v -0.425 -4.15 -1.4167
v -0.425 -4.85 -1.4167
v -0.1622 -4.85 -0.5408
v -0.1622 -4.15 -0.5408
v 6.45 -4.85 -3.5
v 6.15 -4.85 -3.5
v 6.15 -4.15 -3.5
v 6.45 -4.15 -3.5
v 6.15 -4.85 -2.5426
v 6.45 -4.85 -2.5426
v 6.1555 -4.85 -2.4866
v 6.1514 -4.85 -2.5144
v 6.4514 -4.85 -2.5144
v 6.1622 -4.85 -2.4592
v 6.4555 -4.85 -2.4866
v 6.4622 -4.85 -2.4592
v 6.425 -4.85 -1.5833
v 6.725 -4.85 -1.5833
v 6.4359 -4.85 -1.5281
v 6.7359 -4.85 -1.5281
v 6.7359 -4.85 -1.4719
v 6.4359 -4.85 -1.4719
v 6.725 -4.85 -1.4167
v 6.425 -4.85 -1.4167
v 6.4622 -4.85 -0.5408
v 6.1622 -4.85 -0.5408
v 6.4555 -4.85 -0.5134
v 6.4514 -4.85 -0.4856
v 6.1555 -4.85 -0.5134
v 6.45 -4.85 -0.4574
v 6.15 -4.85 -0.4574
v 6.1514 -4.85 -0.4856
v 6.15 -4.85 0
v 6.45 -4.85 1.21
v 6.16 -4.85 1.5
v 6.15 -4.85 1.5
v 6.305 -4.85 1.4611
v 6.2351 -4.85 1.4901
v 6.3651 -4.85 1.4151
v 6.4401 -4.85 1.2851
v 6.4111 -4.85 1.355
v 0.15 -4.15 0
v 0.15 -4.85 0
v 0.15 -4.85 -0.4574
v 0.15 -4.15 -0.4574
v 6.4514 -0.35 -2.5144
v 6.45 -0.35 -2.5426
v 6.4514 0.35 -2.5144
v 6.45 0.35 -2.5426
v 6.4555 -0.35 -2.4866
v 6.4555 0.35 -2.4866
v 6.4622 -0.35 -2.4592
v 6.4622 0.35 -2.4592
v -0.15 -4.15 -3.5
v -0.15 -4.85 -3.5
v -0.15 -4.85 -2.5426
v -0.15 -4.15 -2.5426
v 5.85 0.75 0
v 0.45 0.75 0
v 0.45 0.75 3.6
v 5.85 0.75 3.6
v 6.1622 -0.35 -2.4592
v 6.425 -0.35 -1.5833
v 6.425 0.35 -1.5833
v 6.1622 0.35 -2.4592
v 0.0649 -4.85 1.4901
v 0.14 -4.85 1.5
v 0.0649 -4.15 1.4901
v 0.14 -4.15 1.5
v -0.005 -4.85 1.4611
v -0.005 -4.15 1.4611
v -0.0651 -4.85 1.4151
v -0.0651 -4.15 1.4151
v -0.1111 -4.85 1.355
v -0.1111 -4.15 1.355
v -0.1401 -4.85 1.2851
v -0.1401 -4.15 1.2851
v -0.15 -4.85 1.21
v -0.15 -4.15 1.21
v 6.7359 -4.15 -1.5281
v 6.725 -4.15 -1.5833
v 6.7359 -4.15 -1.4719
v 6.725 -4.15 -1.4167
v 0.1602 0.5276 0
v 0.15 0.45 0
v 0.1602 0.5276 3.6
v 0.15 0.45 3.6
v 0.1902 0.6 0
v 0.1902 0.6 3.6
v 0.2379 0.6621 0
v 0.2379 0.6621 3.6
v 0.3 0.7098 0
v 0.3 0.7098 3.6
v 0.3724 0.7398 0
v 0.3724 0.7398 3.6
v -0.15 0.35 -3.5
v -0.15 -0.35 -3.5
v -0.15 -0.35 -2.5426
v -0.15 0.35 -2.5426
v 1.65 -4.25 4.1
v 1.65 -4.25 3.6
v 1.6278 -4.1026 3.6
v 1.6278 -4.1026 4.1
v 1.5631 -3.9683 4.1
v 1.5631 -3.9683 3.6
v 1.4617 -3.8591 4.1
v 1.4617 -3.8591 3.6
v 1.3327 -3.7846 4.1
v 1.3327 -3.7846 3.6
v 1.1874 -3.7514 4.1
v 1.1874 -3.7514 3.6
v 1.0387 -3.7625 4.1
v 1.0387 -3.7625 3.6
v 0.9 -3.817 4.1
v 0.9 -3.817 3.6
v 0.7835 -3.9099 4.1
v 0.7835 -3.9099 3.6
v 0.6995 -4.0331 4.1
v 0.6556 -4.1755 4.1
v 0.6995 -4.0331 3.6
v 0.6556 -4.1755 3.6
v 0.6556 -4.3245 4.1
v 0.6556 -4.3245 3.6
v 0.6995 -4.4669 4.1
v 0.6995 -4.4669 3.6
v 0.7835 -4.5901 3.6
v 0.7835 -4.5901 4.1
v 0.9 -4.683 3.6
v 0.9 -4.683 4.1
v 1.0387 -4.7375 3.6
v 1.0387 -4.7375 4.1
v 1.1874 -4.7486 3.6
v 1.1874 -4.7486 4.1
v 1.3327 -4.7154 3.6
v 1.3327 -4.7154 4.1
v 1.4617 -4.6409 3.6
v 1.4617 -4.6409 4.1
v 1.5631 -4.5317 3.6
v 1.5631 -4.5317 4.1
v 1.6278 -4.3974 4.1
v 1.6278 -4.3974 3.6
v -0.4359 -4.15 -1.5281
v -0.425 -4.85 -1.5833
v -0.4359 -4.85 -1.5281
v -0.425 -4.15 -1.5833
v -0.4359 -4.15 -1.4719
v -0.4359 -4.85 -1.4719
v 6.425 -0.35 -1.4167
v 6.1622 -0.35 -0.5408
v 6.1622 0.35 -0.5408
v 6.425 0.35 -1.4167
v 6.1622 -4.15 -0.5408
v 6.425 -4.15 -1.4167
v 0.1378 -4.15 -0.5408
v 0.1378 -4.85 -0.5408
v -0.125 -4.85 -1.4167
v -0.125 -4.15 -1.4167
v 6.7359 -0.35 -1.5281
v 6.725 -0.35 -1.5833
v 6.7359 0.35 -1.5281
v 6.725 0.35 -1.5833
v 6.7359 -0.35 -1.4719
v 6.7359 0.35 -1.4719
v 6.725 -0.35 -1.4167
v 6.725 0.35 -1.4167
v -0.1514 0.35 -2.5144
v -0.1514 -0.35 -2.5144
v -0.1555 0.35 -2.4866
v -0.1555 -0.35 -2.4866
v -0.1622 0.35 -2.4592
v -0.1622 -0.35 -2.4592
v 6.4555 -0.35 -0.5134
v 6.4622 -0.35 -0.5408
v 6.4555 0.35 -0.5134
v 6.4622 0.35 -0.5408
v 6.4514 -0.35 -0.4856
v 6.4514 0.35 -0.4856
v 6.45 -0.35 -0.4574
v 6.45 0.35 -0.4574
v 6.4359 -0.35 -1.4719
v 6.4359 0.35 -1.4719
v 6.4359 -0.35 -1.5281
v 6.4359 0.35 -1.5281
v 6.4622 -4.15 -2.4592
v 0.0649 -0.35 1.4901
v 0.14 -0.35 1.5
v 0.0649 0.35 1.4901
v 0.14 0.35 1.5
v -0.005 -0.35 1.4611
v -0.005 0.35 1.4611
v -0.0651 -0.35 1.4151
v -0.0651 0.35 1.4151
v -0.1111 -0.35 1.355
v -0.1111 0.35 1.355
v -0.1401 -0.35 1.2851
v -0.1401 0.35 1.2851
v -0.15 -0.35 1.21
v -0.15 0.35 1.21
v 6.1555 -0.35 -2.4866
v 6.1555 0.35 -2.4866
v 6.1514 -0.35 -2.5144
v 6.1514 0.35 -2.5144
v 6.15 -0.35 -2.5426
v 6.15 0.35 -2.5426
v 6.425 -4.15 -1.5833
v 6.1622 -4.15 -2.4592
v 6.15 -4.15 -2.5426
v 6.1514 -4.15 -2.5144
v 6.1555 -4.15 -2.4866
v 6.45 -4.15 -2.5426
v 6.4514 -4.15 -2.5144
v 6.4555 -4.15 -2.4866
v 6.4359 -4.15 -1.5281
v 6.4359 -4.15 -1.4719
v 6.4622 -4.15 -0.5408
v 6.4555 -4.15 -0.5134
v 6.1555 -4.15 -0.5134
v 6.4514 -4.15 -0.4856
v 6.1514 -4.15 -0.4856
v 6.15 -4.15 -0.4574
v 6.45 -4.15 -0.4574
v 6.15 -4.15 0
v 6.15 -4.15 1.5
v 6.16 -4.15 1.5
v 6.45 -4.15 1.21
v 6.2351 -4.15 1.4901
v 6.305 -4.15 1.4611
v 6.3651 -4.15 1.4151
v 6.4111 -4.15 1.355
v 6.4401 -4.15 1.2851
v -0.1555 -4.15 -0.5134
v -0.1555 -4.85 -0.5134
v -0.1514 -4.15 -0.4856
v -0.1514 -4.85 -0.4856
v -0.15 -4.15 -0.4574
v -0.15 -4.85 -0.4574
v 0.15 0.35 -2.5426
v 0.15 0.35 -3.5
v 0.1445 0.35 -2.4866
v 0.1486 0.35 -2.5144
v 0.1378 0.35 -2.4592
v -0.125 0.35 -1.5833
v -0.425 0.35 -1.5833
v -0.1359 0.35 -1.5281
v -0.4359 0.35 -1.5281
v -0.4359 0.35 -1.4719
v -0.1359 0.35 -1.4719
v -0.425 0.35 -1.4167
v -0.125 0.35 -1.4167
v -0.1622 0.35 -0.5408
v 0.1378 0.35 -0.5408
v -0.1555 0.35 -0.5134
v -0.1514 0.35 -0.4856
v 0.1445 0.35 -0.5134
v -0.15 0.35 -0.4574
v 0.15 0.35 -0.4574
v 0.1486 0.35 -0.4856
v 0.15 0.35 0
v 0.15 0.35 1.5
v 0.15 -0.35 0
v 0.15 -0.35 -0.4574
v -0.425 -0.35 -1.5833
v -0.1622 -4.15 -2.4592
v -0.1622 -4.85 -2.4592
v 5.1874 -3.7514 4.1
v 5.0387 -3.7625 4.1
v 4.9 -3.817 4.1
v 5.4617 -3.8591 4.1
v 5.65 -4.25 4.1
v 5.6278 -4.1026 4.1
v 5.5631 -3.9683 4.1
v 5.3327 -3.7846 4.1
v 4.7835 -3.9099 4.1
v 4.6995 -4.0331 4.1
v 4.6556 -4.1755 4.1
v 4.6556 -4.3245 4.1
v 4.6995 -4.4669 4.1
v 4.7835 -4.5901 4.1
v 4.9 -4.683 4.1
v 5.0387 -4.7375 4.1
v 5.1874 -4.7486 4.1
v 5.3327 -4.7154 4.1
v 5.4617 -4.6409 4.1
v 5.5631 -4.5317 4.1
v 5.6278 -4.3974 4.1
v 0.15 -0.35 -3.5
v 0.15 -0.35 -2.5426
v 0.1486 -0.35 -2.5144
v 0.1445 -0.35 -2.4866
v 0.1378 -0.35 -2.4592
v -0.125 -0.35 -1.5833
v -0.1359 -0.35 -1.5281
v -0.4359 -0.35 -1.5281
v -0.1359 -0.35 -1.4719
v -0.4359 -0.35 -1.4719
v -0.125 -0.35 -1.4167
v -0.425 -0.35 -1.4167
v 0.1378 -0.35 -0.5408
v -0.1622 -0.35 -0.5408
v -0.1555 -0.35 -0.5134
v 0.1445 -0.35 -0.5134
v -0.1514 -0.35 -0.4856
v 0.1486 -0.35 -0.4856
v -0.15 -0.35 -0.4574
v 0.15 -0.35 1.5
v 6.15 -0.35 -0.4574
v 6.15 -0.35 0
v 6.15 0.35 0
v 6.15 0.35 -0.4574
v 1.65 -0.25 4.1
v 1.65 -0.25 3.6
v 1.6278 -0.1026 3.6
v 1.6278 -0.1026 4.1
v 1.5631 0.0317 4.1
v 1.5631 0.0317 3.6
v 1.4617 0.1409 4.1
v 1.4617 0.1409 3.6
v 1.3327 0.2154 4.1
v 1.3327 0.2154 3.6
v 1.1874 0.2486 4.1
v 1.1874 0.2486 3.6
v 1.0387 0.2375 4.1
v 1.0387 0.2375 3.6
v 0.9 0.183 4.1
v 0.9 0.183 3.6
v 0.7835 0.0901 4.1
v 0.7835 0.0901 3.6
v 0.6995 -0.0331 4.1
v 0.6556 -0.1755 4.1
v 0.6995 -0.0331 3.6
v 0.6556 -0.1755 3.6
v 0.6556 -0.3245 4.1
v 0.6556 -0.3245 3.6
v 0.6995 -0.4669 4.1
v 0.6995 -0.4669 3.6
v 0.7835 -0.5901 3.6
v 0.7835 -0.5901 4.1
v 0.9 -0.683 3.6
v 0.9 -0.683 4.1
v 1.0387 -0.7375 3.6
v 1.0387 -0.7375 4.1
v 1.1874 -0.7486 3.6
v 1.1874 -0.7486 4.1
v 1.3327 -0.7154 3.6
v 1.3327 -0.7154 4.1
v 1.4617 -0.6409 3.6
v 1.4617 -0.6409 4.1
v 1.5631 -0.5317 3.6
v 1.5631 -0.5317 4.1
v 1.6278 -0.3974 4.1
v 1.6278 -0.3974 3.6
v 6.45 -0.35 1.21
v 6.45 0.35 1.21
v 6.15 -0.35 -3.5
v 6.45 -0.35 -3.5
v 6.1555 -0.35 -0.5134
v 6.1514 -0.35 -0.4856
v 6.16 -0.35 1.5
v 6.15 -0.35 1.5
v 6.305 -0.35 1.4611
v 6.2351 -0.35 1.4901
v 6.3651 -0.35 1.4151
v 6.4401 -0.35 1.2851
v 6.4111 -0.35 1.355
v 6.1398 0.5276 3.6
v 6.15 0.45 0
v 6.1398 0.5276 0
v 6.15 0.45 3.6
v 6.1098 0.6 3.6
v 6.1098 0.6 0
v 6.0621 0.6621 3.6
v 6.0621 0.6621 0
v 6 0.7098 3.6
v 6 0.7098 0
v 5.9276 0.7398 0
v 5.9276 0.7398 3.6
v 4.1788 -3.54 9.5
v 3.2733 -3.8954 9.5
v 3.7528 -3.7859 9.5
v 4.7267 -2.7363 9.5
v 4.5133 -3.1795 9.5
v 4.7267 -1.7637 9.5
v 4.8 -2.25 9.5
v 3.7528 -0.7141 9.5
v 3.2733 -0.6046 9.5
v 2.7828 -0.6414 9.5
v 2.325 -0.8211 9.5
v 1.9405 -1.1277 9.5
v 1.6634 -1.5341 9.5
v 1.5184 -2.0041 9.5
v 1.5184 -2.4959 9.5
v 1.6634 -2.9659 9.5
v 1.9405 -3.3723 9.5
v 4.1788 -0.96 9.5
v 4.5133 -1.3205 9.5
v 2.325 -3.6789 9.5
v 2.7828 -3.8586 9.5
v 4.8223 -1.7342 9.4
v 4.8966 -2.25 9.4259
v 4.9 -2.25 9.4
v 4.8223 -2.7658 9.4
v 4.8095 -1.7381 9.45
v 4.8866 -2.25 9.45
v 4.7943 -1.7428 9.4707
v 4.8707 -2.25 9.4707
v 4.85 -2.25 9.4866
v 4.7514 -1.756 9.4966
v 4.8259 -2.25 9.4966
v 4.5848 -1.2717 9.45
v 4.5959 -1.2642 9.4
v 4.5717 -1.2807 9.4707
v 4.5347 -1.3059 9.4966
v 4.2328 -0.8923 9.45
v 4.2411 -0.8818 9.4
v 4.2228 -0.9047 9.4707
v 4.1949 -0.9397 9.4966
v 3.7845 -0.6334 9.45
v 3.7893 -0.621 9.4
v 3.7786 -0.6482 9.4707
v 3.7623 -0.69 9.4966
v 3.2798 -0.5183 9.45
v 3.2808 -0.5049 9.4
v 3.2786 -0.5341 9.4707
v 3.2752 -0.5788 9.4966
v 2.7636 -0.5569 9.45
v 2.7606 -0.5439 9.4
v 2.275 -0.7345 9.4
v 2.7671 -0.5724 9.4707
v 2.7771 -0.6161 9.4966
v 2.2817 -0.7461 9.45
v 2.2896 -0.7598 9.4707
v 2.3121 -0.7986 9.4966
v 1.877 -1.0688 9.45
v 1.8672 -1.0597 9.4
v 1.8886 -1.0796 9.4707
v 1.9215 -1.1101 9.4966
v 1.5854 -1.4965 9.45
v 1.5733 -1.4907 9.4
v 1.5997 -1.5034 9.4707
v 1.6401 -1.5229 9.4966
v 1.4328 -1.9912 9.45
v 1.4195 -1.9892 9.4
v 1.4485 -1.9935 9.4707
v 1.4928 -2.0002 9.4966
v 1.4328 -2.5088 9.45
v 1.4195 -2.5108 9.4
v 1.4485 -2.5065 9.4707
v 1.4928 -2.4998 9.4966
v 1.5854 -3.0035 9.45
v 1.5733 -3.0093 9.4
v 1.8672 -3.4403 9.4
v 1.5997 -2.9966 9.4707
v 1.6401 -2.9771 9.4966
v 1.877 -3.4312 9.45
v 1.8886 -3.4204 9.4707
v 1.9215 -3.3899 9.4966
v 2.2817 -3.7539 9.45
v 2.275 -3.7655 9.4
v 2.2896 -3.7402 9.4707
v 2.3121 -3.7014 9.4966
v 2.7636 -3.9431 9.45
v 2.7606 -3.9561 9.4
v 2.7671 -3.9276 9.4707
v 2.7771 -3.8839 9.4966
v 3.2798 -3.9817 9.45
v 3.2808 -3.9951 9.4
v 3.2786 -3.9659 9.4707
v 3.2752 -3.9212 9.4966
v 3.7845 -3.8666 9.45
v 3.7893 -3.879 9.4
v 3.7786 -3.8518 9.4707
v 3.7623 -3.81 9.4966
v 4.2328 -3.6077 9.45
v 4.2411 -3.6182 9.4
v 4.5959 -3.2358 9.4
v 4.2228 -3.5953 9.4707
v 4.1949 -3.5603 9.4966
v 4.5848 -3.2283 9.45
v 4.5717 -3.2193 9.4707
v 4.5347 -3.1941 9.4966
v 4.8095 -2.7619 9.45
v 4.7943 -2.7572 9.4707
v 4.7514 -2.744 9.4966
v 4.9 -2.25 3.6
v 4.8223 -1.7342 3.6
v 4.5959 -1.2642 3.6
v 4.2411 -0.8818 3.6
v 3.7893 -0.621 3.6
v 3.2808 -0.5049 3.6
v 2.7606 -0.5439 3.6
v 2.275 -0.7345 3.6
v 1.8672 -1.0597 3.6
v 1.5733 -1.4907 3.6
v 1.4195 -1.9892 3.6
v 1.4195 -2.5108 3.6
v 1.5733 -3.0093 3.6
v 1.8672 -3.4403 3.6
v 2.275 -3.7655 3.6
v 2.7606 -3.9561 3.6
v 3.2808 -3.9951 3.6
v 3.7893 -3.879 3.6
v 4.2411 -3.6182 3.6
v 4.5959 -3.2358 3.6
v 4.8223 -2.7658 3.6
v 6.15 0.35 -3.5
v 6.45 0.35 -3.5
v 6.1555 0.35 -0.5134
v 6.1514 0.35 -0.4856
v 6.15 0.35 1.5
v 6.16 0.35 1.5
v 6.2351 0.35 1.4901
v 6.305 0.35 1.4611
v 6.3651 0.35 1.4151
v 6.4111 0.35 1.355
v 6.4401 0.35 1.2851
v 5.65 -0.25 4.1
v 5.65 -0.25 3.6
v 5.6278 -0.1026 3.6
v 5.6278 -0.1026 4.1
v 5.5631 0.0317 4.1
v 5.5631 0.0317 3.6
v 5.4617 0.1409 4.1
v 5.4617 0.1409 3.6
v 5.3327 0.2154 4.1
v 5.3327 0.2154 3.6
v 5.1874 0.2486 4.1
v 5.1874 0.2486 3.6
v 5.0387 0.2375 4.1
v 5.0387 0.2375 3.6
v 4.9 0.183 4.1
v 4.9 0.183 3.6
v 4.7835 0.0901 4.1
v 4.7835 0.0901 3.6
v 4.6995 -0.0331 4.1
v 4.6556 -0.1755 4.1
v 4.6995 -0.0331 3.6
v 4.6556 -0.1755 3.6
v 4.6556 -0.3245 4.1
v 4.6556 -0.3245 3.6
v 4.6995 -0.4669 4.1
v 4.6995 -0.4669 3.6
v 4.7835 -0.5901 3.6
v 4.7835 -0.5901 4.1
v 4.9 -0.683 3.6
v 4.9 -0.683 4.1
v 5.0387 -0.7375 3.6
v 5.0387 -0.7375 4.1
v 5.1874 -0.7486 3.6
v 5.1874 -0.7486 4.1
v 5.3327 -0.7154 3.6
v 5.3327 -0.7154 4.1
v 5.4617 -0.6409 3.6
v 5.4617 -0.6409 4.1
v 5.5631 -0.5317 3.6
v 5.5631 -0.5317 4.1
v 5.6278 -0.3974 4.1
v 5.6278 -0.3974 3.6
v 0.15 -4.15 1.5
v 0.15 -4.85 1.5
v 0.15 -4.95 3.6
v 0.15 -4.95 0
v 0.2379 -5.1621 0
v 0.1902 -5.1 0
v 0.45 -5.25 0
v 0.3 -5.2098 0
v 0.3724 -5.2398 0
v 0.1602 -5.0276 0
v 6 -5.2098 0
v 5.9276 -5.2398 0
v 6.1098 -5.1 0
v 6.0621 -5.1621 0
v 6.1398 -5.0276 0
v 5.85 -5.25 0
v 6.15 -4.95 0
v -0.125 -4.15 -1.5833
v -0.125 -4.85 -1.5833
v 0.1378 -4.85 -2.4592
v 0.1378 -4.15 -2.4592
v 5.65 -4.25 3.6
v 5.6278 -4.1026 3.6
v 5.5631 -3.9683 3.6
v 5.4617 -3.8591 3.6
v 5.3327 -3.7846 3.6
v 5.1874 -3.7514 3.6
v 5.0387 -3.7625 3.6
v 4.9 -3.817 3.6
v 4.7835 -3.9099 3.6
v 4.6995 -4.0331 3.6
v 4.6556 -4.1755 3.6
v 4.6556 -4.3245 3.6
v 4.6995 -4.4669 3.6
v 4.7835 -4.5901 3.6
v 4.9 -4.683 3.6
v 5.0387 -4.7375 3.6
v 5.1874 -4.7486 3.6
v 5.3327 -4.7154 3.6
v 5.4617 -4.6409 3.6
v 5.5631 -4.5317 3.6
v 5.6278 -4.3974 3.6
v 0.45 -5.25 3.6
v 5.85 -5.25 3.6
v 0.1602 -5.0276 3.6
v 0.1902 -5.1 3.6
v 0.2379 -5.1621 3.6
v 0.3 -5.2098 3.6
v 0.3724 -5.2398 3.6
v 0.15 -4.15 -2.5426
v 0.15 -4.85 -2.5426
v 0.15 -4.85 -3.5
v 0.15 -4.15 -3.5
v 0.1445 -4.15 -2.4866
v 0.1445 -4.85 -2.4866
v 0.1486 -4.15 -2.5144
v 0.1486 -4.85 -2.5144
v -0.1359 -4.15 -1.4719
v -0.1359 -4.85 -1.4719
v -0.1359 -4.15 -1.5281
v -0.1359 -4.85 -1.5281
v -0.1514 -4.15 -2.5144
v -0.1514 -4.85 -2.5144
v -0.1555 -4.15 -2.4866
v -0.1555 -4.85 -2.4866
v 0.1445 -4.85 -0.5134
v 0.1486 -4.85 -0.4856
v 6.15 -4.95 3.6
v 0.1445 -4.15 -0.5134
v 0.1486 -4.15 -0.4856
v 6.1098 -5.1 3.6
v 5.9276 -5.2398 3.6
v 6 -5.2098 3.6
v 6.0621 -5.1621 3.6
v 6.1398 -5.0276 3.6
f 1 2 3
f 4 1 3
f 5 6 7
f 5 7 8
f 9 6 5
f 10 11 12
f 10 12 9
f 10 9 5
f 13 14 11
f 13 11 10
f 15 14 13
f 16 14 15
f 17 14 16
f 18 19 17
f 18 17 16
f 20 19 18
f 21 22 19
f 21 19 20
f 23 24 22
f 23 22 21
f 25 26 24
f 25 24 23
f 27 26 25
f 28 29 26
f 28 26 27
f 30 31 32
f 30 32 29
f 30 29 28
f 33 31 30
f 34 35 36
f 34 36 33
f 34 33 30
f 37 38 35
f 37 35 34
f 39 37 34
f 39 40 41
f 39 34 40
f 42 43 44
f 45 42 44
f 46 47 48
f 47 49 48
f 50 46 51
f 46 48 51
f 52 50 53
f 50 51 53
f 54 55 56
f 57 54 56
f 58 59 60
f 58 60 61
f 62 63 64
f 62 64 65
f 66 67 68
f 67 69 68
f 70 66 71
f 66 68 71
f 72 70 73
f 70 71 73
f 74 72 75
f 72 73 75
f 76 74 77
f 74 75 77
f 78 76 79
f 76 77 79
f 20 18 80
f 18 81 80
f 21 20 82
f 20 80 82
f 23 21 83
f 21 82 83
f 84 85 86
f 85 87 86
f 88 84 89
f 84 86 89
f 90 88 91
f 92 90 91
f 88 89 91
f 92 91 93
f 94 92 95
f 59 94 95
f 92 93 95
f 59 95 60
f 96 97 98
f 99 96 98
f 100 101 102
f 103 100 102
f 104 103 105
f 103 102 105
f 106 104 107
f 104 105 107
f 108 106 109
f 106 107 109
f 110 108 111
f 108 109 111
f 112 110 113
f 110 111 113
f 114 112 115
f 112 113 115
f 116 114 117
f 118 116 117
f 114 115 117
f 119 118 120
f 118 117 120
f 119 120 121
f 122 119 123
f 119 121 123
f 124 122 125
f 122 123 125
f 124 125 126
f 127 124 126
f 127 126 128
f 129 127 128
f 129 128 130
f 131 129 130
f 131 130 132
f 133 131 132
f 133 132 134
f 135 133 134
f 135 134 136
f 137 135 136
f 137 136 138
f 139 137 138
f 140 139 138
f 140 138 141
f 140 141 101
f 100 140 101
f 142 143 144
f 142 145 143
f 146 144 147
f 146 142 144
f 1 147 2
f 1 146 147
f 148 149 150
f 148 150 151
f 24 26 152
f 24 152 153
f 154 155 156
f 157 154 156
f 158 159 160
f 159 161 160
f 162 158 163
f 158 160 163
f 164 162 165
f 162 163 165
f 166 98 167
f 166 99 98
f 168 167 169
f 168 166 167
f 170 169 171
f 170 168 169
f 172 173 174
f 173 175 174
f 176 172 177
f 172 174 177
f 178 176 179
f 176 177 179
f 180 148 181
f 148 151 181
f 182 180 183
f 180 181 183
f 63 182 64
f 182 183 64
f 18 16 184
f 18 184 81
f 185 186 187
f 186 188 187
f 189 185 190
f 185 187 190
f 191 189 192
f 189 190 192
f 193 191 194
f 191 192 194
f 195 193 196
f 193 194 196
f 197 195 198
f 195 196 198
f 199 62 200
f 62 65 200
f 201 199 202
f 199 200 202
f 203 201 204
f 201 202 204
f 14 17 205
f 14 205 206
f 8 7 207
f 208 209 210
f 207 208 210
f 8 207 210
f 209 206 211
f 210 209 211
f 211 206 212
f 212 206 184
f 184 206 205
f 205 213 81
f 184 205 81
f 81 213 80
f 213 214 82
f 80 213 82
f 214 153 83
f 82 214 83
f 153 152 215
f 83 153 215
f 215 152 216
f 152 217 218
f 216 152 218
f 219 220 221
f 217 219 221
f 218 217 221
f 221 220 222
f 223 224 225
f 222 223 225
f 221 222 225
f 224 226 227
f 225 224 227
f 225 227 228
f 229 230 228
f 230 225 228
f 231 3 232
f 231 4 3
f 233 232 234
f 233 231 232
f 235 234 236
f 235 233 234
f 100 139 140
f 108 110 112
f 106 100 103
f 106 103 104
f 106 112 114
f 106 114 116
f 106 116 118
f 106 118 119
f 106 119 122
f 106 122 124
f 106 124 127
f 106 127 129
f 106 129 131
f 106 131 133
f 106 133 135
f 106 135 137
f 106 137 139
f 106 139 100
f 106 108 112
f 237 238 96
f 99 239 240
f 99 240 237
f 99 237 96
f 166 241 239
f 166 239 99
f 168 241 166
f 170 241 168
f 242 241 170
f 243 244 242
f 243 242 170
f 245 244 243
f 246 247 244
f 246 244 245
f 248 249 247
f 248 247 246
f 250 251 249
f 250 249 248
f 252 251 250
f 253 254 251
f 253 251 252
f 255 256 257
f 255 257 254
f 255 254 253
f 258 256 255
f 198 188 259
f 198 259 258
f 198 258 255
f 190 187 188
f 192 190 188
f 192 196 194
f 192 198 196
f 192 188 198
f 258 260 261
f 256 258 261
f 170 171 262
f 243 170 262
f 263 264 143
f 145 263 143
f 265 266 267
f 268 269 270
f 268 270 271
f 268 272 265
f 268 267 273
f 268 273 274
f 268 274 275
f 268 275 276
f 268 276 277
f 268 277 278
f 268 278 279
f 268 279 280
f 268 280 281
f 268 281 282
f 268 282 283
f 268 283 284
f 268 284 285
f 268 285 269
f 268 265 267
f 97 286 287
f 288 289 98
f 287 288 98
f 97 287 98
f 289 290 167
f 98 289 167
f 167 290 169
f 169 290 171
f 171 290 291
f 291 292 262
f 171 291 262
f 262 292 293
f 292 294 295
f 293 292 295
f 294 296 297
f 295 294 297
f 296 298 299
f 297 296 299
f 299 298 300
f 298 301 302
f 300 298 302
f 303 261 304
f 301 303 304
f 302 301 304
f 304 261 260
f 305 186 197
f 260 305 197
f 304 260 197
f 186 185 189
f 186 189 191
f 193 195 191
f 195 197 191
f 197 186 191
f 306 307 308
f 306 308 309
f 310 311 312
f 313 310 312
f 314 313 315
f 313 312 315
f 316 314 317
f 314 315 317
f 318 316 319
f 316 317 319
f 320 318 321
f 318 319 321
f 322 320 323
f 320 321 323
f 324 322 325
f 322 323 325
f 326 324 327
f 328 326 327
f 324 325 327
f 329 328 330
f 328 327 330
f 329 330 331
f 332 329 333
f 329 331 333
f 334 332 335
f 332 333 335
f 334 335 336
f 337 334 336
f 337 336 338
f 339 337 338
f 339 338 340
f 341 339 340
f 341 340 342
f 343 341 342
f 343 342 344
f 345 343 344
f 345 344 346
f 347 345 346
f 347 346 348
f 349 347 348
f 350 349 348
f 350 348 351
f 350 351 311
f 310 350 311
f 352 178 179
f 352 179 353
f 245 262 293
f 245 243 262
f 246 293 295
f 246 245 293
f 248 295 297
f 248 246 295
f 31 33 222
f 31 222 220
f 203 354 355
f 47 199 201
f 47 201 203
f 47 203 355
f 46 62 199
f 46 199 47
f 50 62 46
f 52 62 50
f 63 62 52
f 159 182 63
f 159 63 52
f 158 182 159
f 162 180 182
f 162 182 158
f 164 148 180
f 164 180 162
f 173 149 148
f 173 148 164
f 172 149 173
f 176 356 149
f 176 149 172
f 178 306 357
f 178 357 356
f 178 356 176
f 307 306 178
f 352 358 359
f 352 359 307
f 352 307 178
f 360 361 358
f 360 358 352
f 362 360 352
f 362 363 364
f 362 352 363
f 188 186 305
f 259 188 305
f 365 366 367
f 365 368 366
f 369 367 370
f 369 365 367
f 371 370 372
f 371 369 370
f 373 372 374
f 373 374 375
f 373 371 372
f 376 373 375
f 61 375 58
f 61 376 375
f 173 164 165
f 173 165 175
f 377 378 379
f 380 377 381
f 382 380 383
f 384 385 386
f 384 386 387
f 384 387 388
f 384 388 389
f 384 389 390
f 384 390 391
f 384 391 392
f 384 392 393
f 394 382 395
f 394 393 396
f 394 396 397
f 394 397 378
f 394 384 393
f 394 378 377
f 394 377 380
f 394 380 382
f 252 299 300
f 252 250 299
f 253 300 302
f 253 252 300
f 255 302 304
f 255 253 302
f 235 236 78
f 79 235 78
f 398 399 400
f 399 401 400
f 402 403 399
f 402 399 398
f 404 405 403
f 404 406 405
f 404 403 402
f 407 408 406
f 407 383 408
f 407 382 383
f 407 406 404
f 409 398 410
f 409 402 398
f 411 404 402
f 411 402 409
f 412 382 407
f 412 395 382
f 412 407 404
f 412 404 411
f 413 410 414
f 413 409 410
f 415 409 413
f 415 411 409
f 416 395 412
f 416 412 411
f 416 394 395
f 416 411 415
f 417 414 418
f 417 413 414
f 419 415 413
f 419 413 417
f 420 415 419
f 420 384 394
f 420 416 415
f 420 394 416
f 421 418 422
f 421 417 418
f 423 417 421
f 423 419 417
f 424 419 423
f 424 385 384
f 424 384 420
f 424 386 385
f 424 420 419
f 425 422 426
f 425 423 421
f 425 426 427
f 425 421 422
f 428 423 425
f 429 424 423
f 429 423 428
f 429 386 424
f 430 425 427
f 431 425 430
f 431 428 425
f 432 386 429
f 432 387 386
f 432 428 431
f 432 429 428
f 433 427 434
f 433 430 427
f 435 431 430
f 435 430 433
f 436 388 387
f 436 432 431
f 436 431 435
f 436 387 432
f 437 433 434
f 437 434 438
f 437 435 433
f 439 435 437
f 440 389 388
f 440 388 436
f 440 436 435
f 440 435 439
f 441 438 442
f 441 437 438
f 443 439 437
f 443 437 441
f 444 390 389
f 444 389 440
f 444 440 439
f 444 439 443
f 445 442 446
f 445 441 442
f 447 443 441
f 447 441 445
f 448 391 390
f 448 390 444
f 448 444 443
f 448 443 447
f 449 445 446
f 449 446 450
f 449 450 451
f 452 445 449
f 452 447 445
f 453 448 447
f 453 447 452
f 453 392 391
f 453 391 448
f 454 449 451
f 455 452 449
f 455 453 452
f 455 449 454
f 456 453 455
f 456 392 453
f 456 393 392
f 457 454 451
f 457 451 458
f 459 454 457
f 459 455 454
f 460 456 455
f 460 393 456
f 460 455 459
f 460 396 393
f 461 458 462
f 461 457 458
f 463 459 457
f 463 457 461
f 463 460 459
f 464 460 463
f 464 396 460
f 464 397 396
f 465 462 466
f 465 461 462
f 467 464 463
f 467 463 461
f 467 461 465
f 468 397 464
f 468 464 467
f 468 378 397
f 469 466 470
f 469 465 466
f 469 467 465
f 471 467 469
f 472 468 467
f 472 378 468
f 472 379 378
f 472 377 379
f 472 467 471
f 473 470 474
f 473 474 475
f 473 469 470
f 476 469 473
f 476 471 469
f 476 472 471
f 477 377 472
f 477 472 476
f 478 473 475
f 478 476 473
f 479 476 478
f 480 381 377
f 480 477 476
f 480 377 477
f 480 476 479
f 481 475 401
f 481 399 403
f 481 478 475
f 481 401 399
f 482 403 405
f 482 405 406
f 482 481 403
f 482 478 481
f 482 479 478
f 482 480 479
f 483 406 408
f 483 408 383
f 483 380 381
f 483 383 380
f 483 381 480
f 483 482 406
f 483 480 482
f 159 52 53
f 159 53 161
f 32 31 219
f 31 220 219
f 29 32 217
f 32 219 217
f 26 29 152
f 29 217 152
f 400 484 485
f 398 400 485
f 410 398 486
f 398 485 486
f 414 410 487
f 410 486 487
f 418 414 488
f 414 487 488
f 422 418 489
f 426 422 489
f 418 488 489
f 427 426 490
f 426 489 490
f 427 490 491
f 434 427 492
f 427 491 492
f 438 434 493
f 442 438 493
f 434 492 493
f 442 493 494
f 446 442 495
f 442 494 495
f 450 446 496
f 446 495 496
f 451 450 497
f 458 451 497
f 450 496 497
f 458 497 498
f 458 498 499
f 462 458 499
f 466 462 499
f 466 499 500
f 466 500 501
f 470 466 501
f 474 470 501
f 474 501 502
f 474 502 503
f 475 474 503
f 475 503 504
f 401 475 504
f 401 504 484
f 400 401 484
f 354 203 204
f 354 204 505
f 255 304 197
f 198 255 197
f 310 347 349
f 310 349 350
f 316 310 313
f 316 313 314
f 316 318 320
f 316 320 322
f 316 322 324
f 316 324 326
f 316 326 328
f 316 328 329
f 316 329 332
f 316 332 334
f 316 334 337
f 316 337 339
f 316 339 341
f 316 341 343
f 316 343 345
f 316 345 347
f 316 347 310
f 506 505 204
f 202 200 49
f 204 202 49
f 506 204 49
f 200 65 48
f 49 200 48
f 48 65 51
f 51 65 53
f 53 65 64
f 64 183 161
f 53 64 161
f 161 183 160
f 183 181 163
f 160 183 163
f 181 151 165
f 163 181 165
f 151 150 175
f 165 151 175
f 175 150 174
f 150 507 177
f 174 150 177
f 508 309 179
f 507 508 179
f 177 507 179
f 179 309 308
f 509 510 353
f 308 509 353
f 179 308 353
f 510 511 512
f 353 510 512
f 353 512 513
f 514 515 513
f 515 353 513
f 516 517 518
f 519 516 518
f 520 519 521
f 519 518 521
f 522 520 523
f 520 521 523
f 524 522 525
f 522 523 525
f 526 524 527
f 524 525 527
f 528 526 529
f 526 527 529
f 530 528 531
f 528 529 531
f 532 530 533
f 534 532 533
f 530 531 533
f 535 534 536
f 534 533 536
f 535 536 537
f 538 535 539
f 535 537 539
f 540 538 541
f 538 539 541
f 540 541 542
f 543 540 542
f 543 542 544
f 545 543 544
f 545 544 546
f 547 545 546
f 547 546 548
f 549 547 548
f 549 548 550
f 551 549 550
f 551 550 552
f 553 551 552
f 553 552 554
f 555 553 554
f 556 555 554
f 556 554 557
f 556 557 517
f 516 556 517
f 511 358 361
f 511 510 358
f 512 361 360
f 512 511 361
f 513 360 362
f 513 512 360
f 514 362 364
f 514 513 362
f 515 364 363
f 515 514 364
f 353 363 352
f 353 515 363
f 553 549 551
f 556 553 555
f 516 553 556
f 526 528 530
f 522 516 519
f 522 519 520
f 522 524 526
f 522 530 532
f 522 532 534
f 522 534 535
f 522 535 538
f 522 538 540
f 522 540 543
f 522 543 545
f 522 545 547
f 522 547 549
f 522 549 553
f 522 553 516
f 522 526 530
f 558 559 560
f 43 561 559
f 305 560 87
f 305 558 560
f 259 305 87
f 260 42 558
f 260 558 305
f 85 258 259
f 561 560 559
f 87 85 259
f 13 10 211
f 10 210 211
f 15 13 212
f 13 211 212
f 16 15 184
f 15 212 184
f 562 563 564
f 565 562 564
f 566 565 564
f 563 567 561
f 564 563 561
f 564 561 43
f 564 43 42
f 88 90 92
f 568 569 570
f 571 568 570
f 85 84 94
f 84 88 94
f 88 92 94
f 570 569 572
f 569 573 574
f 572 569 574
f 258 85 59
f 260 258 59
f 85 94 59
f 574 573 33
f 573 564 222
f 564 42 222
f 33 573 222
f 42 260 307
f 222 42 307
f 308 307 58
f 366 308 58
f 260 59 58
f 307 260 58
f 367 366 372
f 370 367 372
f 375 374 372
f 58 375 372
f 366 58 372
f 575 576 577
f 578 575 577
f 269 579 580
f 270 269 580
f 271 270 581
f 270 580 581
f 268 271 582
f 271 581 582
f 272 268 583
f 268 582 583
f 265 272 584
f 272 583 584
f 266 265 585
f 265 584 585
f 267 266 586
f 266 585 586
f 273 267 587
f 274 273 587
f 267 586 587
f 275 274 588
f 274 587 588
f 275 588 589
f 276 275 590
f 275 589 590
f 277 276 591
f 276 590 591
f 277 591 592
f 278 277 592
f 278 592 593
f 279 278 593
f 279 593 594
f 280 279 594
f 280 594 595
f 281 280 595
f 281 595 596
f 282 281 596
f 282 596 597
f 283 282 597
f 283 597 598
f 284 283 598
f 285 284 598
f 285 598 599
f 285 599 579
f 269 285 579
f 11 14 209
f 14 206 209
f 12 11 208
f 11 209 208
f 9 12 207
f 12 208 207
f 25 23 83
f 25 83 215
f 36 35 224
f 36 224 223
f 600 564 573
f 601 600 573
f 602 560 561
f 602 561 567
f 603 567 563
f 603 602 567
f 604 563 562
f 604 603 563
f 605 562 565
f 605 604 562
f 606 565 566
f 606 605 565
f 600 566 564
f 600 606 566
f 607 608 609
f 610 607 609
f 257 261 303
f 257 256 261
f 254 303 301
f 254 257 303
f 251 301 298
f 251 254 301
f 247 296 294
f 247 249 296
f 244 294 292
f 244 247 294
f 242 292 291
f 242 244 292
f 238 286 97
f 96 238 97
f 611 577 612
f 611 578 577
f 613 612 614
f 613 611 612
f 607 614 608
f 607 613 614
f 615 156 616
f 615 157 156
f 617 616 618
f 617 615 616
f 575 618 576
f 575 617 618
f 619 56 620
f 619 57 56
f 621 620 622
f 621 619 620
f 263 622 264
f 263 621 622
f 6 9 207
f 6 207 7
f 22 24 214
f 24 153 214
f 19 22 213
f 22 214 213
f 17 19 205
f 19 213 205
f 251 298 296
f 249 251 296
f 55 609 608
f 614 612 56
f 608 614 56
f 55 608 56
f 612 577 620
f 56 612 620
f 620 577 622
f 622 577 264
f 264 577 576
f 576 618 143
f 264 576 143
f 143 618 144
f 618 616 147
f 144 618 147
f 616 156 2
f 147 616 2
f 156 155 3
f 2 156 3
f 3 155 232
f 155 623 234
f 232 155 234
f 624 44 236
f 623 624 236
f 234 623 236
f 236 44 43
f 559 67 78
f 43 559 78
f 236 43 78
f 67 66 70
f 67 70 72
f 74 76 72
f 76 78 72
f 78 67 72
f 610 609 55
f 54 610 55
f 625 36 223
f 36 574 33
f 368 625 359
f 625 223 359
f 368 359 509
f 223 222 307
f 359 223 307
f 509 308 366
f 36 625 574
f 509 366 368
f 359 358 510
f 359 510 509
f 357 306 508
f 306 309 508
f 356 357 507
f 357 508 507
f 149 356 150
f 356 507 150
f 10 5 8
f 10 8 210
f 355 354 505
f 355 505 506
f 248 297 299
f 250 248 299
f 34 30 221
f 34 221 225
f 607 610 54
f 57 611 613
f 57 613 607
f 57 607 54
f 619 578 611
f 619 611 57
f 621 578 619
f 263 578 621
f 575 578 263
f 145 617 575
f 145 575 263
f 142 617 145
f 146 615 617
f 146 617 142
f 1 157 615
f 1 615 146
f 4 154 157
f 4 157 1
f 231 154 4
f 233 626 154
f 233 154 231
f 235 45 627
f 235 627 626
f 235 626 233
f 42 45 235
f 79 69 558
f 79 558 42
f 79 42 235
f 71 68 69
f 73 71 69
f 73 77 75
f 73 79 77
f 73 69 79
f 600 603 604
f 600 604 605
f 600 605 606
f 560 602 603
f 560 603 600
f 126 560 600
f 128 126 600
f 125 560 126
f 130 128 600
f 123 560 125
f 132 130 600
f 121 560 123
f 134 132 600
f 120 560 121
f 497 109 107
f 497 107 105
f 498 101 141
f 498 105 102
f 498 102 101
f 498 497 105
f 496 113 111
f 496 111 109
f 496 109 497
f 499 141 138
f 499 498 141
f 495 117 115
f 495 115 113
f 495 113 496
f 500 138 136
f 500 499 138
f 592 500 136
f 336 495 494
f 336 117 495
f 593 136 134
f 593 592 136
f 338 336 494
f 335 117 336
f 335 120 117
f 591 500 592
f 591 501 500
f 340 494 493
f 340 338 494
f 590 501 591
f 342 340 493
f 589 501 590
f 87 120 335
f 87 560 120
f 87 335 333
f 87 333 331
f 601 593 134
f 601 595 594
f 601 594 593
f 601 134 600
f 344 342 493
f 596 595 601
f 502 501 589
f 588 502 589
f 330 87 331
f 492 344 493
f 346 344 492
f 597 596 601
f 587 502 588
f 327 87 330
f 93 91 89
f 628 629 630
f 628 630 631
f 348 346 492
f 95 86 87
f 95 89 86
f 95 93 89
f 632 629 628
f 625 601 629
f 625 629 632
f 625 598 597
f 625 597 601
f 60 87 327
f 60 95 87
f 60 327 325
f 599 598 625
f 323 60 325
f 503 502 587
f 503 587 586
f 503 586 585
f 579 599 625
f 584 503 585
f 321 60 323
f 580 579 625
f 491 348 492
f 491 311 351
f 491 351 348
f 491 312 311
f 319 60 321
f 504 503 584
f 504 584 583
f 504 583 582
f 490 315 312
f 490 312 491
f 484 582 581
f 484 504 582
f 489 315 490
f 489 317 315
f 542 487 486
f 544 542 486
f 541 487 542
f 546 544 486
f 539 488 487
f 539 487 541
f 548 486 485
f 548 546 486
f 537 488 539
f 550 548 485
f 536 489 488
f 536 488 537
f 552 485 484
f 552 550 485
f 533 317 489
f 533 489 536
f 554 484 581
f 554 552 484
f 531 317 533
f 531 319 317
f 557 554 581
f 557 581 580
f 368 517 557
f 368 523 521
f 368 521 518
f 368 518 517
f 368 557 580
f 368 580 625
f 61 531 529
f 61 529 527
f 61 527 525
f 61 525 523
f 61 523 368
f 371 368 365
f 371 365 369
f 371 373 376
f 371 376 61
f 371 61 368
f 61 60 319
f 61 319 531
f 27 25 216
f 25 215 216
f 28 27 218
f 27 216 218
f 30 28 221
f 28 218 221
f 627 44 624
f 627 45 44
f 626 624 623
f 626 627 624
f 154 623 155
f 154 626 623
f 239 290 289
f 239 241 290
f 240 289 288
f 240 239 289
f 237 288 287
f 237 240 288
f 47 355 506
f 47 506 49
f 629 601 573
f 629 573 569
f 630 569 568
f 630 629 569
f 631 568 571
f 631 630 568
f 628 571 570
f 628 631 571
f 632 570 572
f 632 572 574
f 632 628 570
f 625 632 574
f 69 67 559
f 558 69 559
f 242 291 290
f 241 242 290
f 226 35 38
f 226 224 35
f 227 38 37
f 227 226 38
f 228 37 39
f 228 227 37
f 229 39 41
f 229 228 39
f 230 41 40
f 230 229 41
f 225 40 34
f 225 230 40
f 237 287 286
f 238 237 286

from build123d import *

# Parameters (mm, degrees)
SKETCH001_W  = 6
SKETCH001_H  = 6
PAD001_DEPTH = 0.1
FILLET001_R  = 0.3
PAD008_DEPTH = 0.7
FILLET003_R  = 0.29
PAD009_DEPTH = 0.7
FILLET004_R  = 0.29
PAD010_DEPTH = 0.7
FILLET005_R  = 0.29
SKETCH_W     = 6
SKETCH_H     = 6
PAD_DEPTH    = 3.5
FILLET_R     = 0.3
SKETCH004_R  = 0.5
PAD003_DEPTH = 0.6
SKETCH003_R  = 0.5
PAD004_DEPTH = 0.6
SKETCH005_R  = 0.5
PAD002_DEPTH = 0.6
SKETCH002_R  = 0.5
PAD005_DEPTH = 0.6
SKETCH006_R  = 1.75
PAD006_DEPTH = 6
FILLET006_R  = 0.1
PAD007_DEPTH = 0.7
FILLET002_R  = 0.29


with BuildPart() as fillet001:
    # Sketch001 → Pad001 (new body)
    with BuildSketch(Plane.XY.offset(3.5)):
        with Locations((3.15, -2.25)):
            Rectangle(SKETCH001_W, SKETCH001_H)
    extrude(amount=PAD001_DEPTH)

    # Fillet001
    fillet001_edges = [fillet001.edges().sort_by_distance(p)[0] for p in [
        (6.15, -5.25, 3.55),
        (0.15, -5.25, 3.55),
        (6.15, 0.75, 3.55),
        (0.15, 0.75, 3.55),
    ]]
    fillet(fillet001_edges, radius=FILLET001_R)


with BuildPart() as fillet003:
    # Sketch008 → Pad008 (new body)
    with BuildSketch(Plane.XZ.offset(0.35)):
        Polygon((-0.15, 1.5), (0.15, 1.5), (0.15, -0.5), (-0.15, -1.5), (0.15, -2.5), (0.15, -3.5), (-0.15, -3.5), (-0.15, -2.5), (-0.45, -1.5), (-0.15, -0.5), align=None)
    extrude(amount=-PAD008_DEPTH)

    # Fillet003
    fillet003_edges = [fillet003.edges().sort_by_distance(p)[0] for p in [
        (-0.15, 0, -2.5),
        (-0.15, 0, -0.5),
        (-0.45, 0, -1.5),
        (-0.15, 0, 1.5),
        (0.15, 0, -0.5),
        (-0.15, 0, -1.5),
        (0.15, 0, -2.5),
    ]]
    fillet(fillet003_edges, radius=FILLET003_R)


with BuildPart() as fillet004:
    # Sketch009 → Pad009 (new body)
    with BuildSketch(Plane.XZ.offset(4.85)):
        Polygon((6.45, 1.5), (6.15, 1.5), (6.15, -0.5), (6.45, -1.5), (6.15, -2.5), (6.15, -3.5), (6.45, -3.5), (6.45, -2.5), (6.75, -1.5), (6.45, -0.5), align=None)
    extrude(amount=-PAD009_DEPTH)

    # Fillet004
    fillet004_edges = [fillet004.edges().sort_by_distance(p)[0] for p in [
        (6.45, -4.5, -2.5),
        (6.45, -4.5, -0.5),
        (6.75, -4.5, -1.5),
        (6.45, -4.5, 1.5),
        (6.15, -4.5, -0.5),
        (6.45, -4.5, -1.5),
        (6.15, -4.5, -2.5),
    ]]
    fillet(fillet004_edges, radius=FILLET004_R)


with BuildPart() as fillet005:
    # Sketch010 → Pad010 (new body)
    with BuildSketch(Plane.XZ.offset(0.35)):
        Polygon((6.45, 1.5), (6.15, 1.5), (6.15, -0.5), (6.45, -1.5), (6.15, -2.5), (6.15, -3.5), (6.45, -3.5), (6.45, -2.5), (6.75, -1.5), (6.45, -0.5), align=None)
    extrude(amount=-PAD010_DEPTH)

    # Fillet005
    fillet005_edges = [fillet005.edges().sort_by_distance(p)[0] for p in [
        (6.45, 0, -2.5),
        (6.45, 0, -0.5),
        (6.75, 0, -1.5),
        (6.45, 0, 1.5),
        (6.15, 0, -0.5),
        (6.45, 0, -1.5),
        (6.15, 0, -2.5),
    ]]
    fillet(fillet005_edges, radius=FILLET005_R)


with BuildPart() as fillet_body:
    # Sketch → Pad (new body)
    with BuildSketch(Plane.XY):
        with Locations((3.15, -2.25)):
            Rectangle(SKETCH_W, SKETCH_H)
    extrude(amount=PAD_DEPTH)

    # Fillet
    fillet_edges = [fillet_body.edges().sort_by_distance(p)[0] for p in [
        (6.15, 0.75, 1.75),
        (6.15, -5.25, 1.75),
        (0.15, -5.25, 1.75),
        (0.15, 0.75, 1.75),
    ]]
    fillet(fillet_edges, radius=FILLET_R)


with BuildPart() as pad003:
    # Pad003 base: copy of Fillet body
    add(fillet_body.part)

    # Sketch004 → Pad003 (new body)
    with BuildSketch(Plane.XY.offset(3.5)):
        with Locations((5.15, -0.25)):
            Circle(SKETCH004_R)
    extrude(amount=PAD003_DEPTH)


with BuildPart() as pad004:
    # Pad004 base: copy of Fillet body
    add(fillet_body.part)

    # Sketch003 → Pad004 (new body)
    with BuildSketch(Plane.XY.offset(3.5)):
        with Locations((5.15, -4.25)):
            Circle(SKETCH003_R)
    extrude(amount=PAD004_DEPTH)


with BuildPart() as pad002:
    # Pad002 base: copy of Fillet body
    add(fillet_body.part)

    # Sketch005 → Pad002 (new body)
    with BuildSketch(Plane.XY.offset(3.5)):
        with Locations((1.15, -0.25)):
            Circle(SKETCH005_R)
    extrude(amount=PAD002_DEPTH)


with BuildPart() as pad005:
    # Pad005 base: copy of Fillet body
    add(fillet_body.part)

    # Sketch002 → Pad005 (new body)
    with BuildSketch(Plane.XY.offset(3.5)):
        with Locations((1.15, -4.25)):
            Circle(SKETCH002_R)
    extrude(amount=PAD005_DEPTH)


with BuildPart() as fillet006:
    # Pad006 base: copy of Fillet body
    add(fillet_body.part)

    # Sketch006 → Pad006 (new body)
    with BuildSketch(Plane.XY.offset(3.5)):
        with Locations((3.15, -2.25)):
            Circle(SKETCH006_R)
    extrude(amount=PAD006_DEPTH)

    # Fillet006
    fillet006_edges = [fillet006.edges().sort_by_distance(p)[0] for p in [
        (1.4, -2.25, 9.5),
    ]]
    fillet(fillet006_edges, radius=FILLET006_R)


with BuildPart() as sw_push_6mm_h9_5mm:
    # Sketch007 → Pad007 (new body)
    with BuildSketch(Plane.XZ.offset(4.85)):
        Polygon((-0.15, 1.5), (0.15, 1.5), (0.15, -0.5), (-0.15, -1.5), (0.15, -2.5), (0.15, -3.5), (-0.15, -3.5), (-0.15, -2.5), (-0.45, -1.5), (-0.15, -0.5), align=None)
    extrude(amount=-PAD007_DEPTH)

    # Fillet002
    fillet002_edges = [sw_push_6mm_h9_5mm.edges().sort_by_distance(p)[0] for p in [
        (-0.15, -4.5, -2.5),
        (-0.15, -4.5, -0.5),
        (-0.45, -4.5, -1.5),
        (-0.15, -4.5, 1.5),
        (0.15, -4.5, -0.5),
        (-0.15, -4.5, -1.5),
        (0.15, -4.5, -2.5),
    ]]
    fillet(fillet002_edges, radius=FILLET002_R)

    # Fillet002_mp_cp: union Fillet001, Fillet003, Fillet004, Fillet005, Pad003, Pad004, Pad002, Pad005, Fillet006
    add(fillet001.part)
    add(fillet003.part)
    add(fillet004.part)
    add(fillet005.part)
    add(pad003.part)
    add(pad004.part)
    add(pad002.part)
    add(pad005.part)
    add(fillet006.part)


solid = sw_push_6mm_h9_5mm.part
